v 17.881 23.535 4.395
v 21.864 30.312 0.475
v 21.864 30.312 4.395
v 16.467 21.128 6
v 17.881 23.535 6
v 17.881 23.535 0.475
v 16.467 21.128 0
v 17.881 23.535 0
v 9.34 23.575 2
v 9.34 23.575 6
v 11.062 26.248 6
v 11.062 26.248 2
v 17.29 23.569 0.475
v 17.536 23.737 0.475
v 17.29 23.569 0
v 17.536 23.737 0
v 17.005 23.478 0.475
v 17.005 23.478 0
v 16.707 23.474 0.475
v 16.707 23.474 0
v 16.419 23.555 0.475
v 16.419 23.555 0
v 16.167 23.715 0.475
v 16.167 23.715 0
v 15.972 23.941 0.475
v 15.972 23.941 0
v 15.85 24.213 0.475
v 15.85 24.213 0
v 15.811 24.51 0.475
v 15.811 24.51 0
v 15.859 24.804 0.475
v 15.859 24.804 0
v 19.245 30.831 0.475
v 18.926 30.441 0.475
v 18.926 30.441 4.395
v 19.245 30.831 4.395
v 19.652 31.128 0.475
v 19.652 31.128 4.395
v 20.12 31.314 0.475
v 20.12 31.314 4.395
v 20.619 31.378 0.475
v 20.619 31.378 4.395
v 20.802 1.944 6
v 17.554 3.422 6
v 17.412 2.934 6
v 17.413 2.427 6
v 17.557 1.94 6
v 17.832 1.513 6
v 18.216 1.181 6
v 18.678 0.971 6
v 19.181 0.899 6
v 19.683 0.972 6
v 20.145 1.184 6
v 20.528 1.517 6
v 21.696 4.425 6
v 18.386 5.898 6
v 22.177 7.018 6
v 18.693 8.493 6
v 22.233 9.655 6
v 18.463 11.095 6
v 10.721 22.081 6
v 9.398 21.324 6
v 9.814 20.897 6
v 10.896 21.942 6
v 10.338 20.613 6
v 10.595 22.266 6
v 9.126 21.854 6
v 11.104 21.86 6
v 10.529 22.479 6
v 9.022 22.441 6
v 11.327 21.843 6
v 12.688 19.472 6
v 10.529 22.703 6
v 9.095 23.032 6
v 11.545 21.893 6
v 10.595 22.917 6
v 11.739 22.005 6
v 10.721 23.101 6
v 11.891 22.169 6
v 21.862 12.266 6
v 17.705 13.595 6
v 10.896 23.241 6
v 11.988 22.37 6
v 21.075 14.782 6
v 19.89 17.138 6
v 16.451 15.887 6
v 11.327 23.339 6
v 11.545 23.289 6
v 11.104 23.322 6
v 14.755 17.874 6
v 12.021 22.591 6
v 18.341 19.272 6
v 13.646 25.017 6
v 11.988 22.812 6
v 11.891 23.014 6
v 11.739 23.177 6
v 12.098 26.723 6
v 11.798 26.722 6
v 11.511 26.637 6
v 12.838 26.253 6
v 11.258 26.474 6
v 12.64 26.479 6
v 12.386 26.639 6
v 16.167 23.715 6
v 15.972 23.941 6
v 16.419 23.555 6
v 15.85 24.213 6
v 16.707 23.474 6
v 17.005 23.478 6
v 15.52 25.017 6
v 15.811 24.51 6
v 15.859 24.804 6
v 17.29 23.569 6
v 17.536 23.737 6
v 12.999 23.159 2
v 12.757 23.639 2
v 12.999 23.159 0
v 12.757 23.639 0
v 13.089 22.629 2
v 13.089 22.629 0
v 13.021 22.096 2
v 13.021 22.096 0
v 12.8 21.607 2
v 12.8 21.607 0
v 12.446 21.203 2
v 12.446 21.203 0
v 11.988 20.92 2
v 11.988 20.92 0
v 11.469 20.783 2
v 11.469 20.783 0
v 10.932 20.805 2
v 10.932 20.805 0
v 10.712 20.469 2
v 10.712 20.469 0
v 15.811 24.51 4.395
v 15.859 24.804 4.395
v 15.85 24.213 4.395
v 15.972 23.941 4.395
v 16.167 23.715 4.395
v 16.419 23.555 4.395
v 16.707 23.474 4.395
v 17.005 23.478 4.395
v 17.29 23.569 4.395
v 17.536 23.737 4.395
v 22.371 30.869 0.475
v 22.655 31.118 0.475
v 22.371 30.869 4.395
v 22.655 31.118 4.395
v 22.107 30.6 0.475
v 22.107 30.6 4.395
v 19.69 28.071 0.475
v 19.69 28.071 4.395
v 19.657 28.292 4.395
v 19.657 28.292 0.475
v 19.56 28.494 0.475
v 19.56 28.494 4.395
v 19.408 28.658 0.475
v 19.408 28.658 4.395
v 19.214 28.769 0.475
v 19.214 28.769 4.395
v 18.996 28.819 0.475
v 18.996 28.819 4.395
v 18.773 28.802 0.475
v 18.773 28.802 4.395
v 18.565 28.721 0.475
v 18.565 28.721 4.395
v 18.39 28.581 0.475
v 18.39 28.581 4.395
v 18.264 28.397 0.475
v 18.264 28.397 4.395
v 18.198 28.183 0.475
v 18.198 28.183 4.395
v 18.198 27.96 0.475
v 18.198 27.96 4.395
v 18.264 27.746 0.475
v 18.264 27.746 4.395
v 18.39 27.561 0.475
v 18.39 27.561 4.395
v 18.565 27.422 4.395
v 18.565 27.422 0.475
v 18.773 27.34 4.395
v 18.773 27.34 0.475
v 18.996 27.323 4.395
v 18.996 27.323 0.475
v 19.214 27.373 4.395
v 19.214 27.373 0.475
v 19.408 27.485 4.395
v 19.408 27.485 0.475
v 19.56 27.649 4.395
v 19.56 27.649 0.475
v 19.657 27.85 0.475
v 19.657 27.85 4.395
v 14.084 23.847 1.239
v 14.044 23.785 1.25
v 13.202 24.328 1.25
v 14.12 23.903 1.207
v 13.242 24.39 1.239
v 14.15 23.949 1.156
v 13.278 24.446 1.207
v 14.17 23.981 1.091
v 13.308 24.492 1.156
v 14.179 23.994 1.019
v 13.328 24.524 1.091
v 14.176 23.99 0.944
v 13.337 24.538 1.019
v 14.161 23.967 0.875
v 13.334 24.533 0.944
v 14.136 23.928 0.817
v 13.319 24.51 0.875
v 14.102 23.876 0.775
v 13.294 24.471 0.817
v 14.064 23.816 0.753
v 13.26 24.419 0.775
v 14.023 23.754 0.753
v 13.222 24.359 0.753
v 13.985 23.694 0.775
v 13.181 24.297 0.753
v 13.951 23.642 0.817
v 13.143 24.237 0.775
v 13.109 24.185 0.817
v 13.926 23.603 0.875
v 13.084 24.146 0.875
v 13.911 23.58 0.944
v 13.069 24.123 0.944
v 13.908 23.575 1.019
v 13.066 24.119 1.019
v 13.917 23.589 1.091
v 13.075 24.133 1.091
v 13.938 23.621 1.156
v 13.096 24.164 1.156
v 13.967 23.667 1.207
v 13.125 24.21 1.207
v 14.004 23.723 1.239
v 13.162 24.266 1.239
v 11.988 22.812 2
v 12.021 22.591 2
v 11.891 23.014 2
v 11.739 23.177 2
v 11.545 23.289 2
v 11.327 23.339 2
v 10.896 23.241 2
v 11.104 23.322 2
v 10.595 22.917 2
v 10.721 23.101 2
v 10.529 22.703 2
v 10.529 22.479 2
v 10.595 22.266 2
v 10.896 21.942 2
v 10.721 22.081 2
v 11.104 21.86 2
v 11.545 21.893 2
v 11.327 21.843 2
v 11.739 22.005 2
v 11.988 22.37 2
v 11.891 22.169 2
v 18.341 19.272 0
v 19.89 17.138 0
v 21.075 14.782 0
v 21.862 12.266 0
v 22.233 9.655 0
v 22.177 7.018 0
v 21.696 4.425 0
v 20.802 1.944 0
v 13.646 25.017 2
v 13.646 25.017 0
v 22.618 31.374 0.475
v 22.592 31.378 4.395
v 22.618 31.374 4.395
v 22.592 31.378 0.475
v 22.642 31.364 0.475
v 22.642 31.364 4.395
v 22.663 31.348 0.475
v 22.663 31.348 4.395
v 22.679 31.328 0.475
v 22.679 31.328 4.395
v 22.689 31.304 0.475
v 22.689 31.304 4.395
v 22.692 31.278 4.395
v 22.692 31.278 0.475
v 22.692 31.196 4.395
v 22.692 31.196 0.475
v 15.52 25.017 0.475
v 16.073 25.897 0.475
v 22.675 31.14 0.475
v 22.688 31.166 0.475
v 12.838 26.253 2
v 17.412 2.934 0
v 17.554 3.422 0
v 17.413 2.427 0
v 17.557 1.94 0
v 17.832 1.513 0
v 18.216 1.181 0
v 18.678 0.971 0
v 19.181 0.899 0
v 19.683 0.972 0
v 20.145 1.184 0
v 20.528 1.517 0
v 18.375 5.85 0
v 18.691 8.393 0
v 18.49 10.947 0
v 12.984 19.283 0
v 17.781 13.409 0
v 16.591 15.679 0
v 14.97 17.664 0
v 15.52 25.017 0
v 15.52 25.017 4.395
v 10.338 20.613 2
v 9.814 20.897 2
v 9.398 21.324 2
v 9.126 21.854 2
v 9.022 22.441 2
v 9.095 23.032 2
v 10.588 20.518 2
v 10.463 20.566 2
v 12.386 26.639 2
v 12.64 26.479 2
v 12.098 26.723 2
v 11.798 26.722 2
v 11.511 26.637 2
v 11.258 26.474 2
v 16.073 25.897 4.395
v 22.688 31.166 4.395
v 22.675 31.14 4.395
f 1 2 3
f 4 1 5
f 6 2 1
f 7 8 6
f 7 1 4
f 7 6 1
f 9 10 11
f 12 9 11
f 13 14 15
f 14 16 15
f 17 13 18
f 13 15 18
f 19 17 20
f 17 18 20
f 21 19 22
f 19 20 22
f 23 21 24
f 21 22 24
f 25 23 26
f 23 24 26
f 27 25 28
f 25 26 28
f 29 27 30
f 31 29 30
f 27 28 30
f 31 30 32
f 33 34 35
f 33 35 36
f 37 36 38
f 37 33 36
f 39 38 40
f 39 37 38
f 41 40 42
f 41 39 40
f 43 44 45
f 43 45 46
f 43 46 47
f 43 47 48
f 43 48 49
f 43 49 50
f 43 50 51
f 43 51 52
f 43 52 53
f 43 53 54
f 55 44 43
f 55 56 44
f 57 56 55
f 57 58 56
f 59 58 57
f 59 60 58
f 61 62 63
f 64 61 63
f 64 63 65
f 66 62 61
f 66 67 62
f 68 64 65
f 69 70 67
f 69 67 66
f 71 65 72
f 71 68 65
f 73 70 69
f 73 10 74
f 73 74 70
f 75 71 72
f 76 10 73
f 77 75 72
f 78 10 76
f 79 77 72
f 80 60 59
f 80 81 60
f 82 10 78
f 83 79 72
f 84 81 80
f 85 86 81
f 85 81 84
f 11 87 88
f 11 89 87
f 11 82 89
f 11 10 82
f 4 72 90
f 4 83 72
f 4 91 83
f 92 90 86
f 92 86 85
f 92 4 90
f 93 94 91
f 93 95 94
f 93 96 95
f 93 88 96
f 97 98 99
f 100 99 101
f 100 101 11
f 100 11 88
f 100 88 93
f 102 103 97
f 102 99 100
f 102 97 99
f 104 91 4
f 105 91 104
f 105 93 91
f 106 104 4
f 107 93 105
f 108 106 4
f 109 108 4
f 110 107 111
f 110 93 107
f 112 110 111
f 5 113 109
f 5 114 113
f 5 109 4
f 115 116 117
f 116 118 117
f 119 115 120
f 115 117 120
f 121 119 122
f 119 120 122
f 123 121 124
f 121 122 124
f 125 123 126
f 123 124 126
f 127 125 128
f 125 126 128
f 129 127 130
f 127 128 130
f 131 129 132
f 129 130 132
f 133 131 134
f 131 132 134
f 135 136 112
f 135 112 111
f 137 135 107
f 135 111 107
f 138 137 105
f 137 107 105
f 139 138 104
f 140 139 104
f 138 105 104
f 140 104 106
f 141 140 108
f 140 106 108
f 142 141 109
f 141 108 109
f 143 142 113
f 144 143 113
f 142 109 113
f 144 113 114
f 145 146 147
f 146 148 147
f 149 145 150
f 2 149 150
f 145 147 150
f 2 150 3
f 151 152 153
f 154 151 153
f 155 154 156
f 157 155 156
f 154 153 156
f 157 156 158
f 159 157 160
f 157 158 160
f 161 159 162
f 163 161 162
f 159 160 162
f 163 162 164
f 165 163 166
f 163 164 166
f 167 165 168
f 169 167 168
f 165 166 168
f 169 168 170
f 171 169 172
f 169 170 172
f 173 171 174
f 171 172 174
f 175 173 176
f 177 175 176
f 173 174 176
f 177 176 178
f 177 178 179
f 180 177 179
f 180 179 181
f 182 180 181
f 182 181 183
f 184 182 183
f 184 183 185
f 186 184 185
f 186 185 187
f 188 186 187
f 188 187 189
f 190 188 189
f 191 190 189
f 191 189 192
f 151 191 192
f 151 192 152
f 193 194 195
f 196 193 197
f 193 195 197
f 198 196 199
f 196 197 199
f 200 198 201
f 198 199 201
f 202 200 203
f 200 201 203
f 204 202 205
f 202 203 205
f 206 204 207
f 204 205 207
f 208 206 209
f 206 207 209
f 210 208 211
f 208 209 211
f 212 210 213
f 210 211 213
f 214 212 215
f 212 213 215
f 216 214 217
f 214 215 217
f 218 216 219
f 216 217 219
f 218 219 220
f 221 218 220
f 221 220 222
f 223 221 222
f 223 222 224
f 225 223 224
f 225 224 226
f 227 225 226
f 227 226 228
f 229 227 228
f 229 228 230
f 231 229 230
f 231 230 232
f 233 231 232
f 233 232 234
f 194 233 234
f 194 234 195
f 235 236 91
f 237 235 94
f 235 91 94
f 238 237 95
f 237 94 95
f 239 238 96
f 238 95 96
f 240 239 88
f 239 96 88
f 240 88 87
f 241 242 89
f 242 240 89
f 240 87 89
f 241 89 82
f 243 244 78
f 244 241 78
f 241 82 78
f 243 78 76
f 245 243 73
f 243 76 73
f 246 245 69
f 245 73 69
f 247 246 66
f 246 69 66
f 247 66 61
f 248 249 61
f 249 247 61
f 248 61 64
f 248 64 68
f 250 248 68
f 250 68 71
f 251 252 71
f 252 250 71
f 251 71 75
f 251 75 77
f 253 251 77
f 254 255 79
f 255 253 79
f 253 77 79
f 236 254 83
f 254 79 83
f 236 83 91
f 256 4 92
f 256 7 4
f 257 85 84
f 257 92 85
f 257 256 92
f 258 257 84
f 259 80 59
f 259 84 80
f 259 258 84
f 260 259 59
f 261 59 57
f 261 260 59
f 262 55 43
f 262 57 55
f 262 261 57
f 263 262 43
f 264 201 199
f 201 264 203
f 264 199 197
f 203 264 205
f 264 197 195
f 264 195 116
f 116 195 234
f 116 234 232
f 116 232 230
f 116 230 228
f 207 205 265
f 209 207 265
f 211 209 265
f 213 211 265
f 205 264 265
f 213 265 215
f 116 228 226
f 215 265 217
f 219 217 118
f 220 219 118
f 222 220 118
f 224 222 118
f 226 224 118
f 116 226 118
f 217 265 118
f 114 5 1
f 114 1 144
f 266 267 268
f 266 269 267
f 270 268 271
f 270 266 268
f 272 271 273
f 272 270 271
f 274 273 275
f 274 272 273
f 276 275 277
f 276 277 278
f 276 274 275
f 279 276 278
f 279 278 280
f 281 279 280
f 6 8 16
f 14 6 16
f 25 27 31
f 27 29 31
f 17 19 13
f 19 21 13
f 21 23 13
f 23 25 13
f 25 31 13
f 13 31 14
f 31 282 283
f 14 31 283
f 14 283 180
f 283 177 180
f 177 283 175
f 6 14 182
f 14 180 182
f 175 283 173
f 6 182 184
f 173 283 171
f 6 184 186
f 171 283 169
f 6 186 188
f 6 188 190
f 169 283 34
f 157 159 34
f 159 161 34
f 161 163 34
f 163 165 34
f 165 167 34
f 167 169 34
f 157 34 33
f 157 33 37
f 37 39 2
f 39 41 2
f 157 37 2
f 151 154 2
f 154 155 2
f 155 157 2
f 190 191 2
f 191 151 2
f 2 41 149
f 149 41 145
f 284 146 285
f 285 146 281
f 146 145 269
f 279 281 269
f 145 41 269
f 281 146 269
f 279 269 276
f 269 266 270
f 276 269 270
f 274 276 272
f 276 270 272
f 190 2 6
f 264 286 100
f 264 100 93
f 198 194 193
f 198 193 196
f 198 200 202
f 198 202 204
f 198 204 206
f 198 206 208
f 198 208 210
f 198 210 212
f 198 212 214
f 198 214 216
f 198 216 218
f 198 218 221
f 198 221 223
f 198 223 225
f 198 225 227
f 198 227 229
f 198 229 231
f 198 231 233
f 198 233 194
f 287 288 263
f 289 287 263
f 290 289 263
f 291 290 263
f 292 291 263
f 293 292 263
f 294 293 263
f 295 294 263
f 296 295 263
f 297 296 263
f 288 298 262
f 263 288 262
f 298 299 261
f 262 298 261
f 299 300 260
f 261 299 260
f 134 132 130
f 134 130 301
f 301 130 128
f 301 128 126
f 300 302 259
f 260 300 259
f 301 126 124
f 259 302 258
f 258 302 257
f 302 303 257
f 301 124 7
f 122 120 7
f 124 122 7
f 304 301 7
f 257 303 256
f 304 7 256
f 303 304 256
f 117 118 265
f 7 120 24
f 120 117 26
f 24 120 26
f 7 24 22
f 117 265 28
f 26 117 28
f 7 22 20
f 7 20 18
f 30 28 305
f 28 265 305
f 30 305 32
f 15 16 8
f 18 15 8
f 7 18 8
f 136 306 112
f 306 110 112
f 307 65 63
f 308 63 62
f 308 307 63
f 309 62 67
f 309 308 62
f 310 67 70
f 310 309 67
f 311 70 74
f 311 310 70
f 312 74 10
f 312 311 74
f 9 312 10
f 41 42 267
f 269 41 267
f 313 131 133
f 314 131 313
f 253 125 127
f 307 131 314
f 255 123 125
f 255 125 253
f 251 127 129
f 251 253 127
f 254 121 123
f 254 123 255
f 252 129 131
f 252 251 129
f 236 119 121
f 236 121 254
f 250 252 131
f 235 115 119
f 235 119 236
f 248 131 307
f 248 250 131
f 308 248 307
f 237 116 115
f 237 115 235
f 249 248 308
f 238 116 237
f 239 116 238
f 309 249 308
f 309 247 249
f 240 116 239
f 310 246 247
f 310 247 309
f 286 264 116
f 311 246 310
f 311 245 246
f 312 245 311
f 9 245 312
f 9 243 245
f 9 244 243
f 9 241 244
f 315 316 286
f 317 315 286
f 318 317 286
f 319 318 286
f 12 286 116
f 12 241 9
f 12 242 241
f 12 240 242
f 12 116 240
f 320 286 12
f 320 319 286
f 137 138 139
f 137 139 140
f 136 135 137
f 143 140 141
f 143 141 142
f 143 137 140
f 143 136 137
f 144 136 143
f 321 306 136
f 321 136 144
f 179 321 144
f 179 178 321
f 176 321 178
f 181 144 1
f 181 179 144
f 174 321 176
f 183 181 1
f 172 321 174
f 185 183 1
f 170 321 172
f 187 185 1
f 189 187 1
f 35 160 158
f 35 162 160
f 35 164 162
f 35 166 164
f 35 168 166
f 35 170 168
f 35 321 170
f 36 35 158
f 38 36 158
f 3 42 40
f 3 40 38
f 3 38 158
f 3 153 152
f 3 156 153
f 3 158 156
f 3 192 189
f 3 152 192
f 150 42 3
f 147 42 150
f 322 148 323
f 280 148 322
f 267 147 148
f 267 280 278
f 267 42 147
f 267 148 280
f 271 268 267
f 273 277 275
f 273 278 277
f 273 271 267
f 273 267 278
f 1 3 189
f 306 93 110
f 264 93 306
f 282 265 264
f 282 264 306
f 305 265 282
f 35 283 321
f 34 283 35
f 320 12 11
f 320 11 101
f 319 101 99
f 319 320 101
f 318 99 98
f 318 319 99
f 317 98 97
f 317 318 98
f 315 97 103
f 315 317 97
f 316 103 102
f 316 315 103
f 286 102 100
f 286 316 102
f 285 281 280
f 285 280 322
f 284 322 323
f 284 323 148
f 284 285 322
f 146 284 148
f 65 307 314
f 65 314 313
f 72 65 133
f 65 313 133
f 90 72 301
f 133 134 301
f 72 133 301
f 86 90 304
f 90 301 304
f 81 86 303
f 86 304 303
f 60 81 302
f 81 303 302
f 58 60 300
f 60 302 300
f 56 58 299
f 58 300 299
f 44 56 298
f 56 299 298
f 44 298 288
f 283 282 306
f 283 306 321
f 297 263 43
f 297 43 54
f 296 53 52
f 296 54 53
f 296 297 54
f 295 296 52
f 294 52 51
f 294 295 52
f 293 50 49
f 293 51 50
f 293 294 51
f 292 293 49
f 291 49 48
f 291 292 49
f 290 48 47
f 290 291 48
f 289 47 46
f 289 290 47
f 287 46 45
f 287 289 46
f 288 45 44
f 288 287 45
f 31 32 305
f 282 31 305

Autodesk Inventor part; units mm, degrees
ref_plane "YZ Plane" through (0, 0, 0) normal (1, 0, 0) x (0, 1, 0)
ref_plane "XZ Plane" through (0, 0, 0) normal (0, 1, 0) x (-1, 0, 0)
ref_plane "XY Plane" through (0, 0, 0) normal (0, 0, 1) x (1, 0, 0)
sketch "Sketch1" plane through (0, 0, 0) normal (0, 0, 1) x (1, 0, 0)
  line L0 (20.6194, 31.3777) -> (22.4899, 31.3777)
  line L1 (22.4899, 31.3777) -> (16.467, 21.1278)
  arc A0 (20.8023, 1.9443) -> (16.467, 21.1278) centre (5.9969, 8.6801) ccw
  line L2 (16.073, 25.8973) -> (18.9256, 30.4411)
  arc A1 (20.6194, 31.3777) -> (18.9256, 30.4411) centre (20.6194, 29.3777) ccw
  line L3 (13.6459, 25.017) -> (15.5204, 25.017)
  line L4 (15.5204, 25.017) -> (16.073, 25.8973)
  arc A2 (17.5545, 3.4219) -> (20.8023, 1.9443) centre (19.1784, 2.6831) ccw
  arc A3 (17.5545, 3.4219) -> (10.3375, 20.6126) centre (5.9969, 8.6801) ccw
  line L5 (9.3399, 23.5753) -> (11.0617, 26.2476)
  line L6 (12.8378, 26.2534) -> (13.6459, 25.017)
  arc A4 (9.3399, 23.5753) -> (10.3375, 20.6126) centre (11.0212, 22.4921) ccw
  arc A5 (12.8378, 26.2534) -> (11.0617, 26.2476) centre (11.9516, 25.6742) ccw
  point P0 (0, 0)
  point P1 (7.8374, 21.2434)
  dimension "d6" = 2
  dimension "d53" = 2
extrude "Extrusion12" add sketch "Sketch1" along normal blind 7
sketch "Sketch14" plane through (0, 0, 7) normal (0, 0, 1) x (1, 0, 0)
  circle A0 centre (11.2711, 22.5911) radius 0.75
  circle A1 centre (18.9401, 28.0713) radius 0.75
  point P0 (0, 0)
  dimension "d56" = 1.5
  dimension "d57" = 1.5
extrude "Extrusion13" cut sketch "Sketch14" against normal through all
sketch "Sketch15" plane through (0, 0, 0) normal (0, 0, -1) x (-1, 0, 0)
  arc A0 (-12.7572, 23.6392) -> (-10.9318, 20.8046) centre (-11.2711, 22.5911) ccw
  circle A1 centre (-18.9401, 28.0713) radius 0.75 projected
  circle A2 centre (-11.2711, 22.5911) radius 0.75 projected
  line L0 (-22.4899, 31.3777) -> (-20.6194, 31.3777) projected
  line L1 (-16.467, 21.1278) -> (-22.4899, 31.3777) projected
  arc A3 (-16.467, 21.1278) -> (-20.8023, 1.9443) centre (-5.9969, 8.6801) ccw projected
  arc A4 (-20.8023, 1.9443) -> (-17.5545, 3.4219) centre (-19.1784, 2.6831) ccw projected
  arc A5 (-10.3375, 20.6126) -> (-17.5545, 3.4219) centre (-5.9969, 8.6801) ccw projected
  arc A6 (-10.3375, 20.6126) -> (-9.3399, 23.5753) centre (-11.0212, 22.4921) ccw projected
  line L2 (-11.0617, 26.2476) -> (-9.3399, 23.5753) projected
  arc A7 (-11.0617, 26.2476) -> (-12.8378, 26.2534) centre (-11.9516, 25.6742) ccw projected
  line L3 (-13.6459, 25.017) -> (-12.8378, 26.2534) projected
  line L4 (-15.5204, 25.017) -> (-13.6459, 25.017) projected
  line L5 (-18.9256, 30.4411) -> (-15.5204, 25.017) projected
  arc A8 (-18.9256, 30.4411) -> (-20.6194, 31.3777) centre (-20.6194, 29.3777) ccw projected
  line L6 (-10.9318, 20.8046) -> (-10.7125, 20.4694)
  arc A9 (-10.3375, 20.6126) -> (-17.5545, 3.4219) centre (-5.9969, 8.6801) ccw projected
  line L7 (-13.6459, 25.017) -> (-12.7572, 23.6392)
  point P0 (0, 0)
extrude "Extrusion17" cut sketch "Sketch15" against normal blind 2 contours L7 L3 A7 L2 A6 A5 L6 A0
sketch "Sketch18" plane through (0, 0, 7) normal (0, 0, 1) x (1, 0, 0)
  circle A0 centre (18.9401, 28.0713) radius 0.75 projected
  circle A1 centre (11.2711, 22.5911) radius 0.75 projected
  line L0 (22.4899, 31.3777) -> (20.6194, 31.3777) projected
  arc A2 (20.6194, 31.3777) -> (18.9256, 30.4411) centre (20.6194, 29.3777) ccw projected
  line L1 (18.9256, 30.4411) -> (15.5204, 25.017) projected
  line L2 (15.5204, 25.017) -> (13.6459, 25.017) projected
  line L3 (13.6459, 25.017) -> (12.8378, 26.2534) projected
  arc A3 (12.8378, 26.2534) -> (11.0617, 26.2476) centre (11.9516, 25.6742) ccw projected
  line L4 (11.0617, 26.2476) -> (9.3399, 23.5753) projected
  arc A4 (9.3399, 23.5753) -> (10.3375, 20.6126) centre (11.0212, 22.4921) ccw projected
  arc A5 (17.5545, 3.4219) -> (10.3375, 20.6126) centre (5.9969, 8.6801) ccw projected
  arc A6 (17.5545, 3.4219) -> (20.8023, 1.9443) centre (19.1784, 2.6831) ccw projected
  arc A7 (20.8023, 1.9443) -> (16.467, 21.1278) centre (5.9969, 8.6801) ccw projected
  line L5 (16.467, 21.1278) -> (22.4899, 31.3777) projected
  line L6 (16.467, 21.1278) -> (22.4899, 31.3777) projected
  line L7 (15.5204, 25.017) -> (15.8591, 24.8043)
  line L8 (17.8813, 23.5348) -> (17.5365, 23.7374)
  arc A8 (15.8591, 24.8043) -> (17.5365, 23.7374) centre (16.8393, 24.4933) ccw
  point P0 (0, 0)
  dimension "d75" = 0.4
  dimension "d76" = 0.4
extrude "Extrusion18" cut sketch "Sketch18" against normal blind 2.605 contours L5 L8 A8 L7 L1 A2 L0
sketch "Sketch19" plane through (12.7572, 23.6392, 0) normal (-0.8403389, 0.5420613, 0) x (0, 0, 1)
  line L0 (0, 0) -> (0, 1.6395) projected
  line L1 (0, 0) -> (2, 0) projected
  line L2 (2, 0) -> (2, 1.6395) projected
  line L3 (0, 1.6395) -> (2, 1.6395) projected
  circle A0 centre (1, 0.8198) radius 0.25
  line L4 (0, 0) -> (2, 0) projected
  line L5 (2, 1.6395) -> (0, 0)
  line L6 (0, 0) -> (0, 1.6395)
  line L7 (2, 0) -> (0, 1.6395)
  point P0 (0, -26.7801)
  dimension "d79" = 0.5
extrude "Extrusion19" cut sketch "Sketch19" against normal blind 1 contours L5 L7 A0 | A0 L7 L5 | A0 L5 L7 | L7 L5 A0
sketch "Sketch20" plane through (22.4899, 31.3777, 0) normal (0, 0, -1) x (-1, 0, 0)
  line L0 (11.7774, -10.9083) -> (11.5581, -10.5731) projected
  arc A0 (9.7327, -7.7385) -> (11.5581, -10.5731) centre (11.2188, -8.7866) ccw projected
  line L1 (9.7327, -7.7385) -> (8.844, -6.3607) projected
  line L2 (6.9695, -6.3607) -> (8.844, -6.3607) projected
  line L3 (3.5643, -0.9366) -> (6.9695, -6.3607) projected
  arc A1 (3.5643, -0.9366) -> (1.8705, 0) centre (1.8705, -2) ccw projected
  line L4 (0, 0) -> (1.8705, 0) projected
  line L5 (6.0229, -10.2499) -> (0, 0) projected
  arc A2 (6.0229, -10.2499) -> (1.6876, -29.4334) centre (16.493, -22.6976) ccw projected
  arc A3 (1.6876, -29.4334) -> (4.9355, -27.9558) centre (3.3115, -28.6946) ccw projected
  arc A4 (11.7774, -10.9083) -> (4.9355, -27.9558) centre (16.493, -22.6976) ccw projected
  circle A5 centre (3.5498, -3.3064) radius 0.75 projected
  line L6 (6.6308, -6.5734) -> (6.9695, -6.3607) projected
  arc A6 (4.9534, -7.6403) -> (6.6308, -6.5734) centre (5.6506, -6.8844) ccw projected
  line L7 (4.6086, -7.8429) -> (4.9534, -7.6403) projected
  point P0 (22.4899, -31.3777)
extrude "Extrusion20" cut sketch "Sketch20" against normal blind 0.475 contours L6 A6 L7 L5 L4 A1 L3
sketch "Sketch22" plane through (20.6194, 31.3777, 4.395) normal (0, 0, 1) x (1, 0, 0)
  circle A0 centre (-1.6793, -3.3064) radius 0.75 projected
  line L0 (0, 0) -> (1.8705, 0) projected
  arc A1 (0, 0) -> (-1.6939, -0.9366) centre (0, -2) ccw projected
  line L1 (-5.0991, -6.3607) -> (-1.6939, -0.9366) projected
  line L2 (-4.7603, -6.5734) -> (-5.0991, -6.3607) projected
  arc A2 (-4.7603, -6.5734) -> (-3.083, -7.6403) centre (-3.7801, -6.8844) ccw projected
  line L3 (-2.7381, -7.8429) -> (-3.083, -7.6403) projected
  line L4 (1.8705, 0) -> (-2.7381, -7.8429) projected
  line L5 (0, 0) -> (2.0726, 0)
  line L6 (2.0726, 0) -> (2.0726, -0.23)
  arc A3 (2.0726, -0.23) -> (0.5611, -2.2282) centre (5.2352, -4.1929) ccw
  point P0 (-20.6194, -31.3777)
  point P1 (1.2441, -1.066)
  dimension "d99" = 0.23
extrude "Extrusion22" add sketch "Sketch22" against normal up to surface (3.92 mm away) contours L5 L6 A3 L4
fillet "Fillet8" radius 0.1 2 edges at (22.6921, 31.1477, 2.435) (22.6921, 31.3777, 2.435)
sketch "Sketch23" plane through (0, 0, 7) normal (0, 0, 1) x (1, 0, 0)
  line L0 (15.8591, 24.8043) -> (15.5204, 25.017) projected
  line L1 (15.5204, 25.017) -> (13.6459, 25.017) projected
  line L2 (13.6459, 25.017) -> (12.8378, 26.2534) projected
  arc A0 (12.8378, 26.2534) -> (11.0617, 26.2476) centre (11.9516, 25.6742) ccw projected
  line L3 (11.0617, 26.2476) -> (9.3399, 23.5753) projected
  arc A1 (9.3399, 23.5753) -> (10.3375, 20.6126) centre (11.0212, 22.4921) ccw projected
  arc A2 (17.5545, 3.4219) -> (10.3375, 20.6126) centre (5.9969, 8.6801) ccw projected
  arc A3 (17.5545, 3.4219) -> (20.8023, 1.9443) centre (19.1784, 2.6831) ccw projected
  arc A4 (20.8023, 1.9443) -> (16.467, 21.1278) centre (5.9969, 8.6801) ccw projected
  line L4 (16.467, 21.1278) -> (17.8813, 23.5348) projected
  line L5 (17.8813, 23.5348) -> (17.5365, 23.7374) projected
  arc A5 (15.8591, 24.8043) -> (17.5365, 23.7374) centre (16.8393, 24.4933) ccw projected
  circle A6 centre (11.2711, 22.5911) radius 0.75 projected
  point P0 (0, 0)
extrude "Extrusion23" cut sketch "Sketch23" against normal blind 1
properties material "Nickel-Copper Alloy 400"
